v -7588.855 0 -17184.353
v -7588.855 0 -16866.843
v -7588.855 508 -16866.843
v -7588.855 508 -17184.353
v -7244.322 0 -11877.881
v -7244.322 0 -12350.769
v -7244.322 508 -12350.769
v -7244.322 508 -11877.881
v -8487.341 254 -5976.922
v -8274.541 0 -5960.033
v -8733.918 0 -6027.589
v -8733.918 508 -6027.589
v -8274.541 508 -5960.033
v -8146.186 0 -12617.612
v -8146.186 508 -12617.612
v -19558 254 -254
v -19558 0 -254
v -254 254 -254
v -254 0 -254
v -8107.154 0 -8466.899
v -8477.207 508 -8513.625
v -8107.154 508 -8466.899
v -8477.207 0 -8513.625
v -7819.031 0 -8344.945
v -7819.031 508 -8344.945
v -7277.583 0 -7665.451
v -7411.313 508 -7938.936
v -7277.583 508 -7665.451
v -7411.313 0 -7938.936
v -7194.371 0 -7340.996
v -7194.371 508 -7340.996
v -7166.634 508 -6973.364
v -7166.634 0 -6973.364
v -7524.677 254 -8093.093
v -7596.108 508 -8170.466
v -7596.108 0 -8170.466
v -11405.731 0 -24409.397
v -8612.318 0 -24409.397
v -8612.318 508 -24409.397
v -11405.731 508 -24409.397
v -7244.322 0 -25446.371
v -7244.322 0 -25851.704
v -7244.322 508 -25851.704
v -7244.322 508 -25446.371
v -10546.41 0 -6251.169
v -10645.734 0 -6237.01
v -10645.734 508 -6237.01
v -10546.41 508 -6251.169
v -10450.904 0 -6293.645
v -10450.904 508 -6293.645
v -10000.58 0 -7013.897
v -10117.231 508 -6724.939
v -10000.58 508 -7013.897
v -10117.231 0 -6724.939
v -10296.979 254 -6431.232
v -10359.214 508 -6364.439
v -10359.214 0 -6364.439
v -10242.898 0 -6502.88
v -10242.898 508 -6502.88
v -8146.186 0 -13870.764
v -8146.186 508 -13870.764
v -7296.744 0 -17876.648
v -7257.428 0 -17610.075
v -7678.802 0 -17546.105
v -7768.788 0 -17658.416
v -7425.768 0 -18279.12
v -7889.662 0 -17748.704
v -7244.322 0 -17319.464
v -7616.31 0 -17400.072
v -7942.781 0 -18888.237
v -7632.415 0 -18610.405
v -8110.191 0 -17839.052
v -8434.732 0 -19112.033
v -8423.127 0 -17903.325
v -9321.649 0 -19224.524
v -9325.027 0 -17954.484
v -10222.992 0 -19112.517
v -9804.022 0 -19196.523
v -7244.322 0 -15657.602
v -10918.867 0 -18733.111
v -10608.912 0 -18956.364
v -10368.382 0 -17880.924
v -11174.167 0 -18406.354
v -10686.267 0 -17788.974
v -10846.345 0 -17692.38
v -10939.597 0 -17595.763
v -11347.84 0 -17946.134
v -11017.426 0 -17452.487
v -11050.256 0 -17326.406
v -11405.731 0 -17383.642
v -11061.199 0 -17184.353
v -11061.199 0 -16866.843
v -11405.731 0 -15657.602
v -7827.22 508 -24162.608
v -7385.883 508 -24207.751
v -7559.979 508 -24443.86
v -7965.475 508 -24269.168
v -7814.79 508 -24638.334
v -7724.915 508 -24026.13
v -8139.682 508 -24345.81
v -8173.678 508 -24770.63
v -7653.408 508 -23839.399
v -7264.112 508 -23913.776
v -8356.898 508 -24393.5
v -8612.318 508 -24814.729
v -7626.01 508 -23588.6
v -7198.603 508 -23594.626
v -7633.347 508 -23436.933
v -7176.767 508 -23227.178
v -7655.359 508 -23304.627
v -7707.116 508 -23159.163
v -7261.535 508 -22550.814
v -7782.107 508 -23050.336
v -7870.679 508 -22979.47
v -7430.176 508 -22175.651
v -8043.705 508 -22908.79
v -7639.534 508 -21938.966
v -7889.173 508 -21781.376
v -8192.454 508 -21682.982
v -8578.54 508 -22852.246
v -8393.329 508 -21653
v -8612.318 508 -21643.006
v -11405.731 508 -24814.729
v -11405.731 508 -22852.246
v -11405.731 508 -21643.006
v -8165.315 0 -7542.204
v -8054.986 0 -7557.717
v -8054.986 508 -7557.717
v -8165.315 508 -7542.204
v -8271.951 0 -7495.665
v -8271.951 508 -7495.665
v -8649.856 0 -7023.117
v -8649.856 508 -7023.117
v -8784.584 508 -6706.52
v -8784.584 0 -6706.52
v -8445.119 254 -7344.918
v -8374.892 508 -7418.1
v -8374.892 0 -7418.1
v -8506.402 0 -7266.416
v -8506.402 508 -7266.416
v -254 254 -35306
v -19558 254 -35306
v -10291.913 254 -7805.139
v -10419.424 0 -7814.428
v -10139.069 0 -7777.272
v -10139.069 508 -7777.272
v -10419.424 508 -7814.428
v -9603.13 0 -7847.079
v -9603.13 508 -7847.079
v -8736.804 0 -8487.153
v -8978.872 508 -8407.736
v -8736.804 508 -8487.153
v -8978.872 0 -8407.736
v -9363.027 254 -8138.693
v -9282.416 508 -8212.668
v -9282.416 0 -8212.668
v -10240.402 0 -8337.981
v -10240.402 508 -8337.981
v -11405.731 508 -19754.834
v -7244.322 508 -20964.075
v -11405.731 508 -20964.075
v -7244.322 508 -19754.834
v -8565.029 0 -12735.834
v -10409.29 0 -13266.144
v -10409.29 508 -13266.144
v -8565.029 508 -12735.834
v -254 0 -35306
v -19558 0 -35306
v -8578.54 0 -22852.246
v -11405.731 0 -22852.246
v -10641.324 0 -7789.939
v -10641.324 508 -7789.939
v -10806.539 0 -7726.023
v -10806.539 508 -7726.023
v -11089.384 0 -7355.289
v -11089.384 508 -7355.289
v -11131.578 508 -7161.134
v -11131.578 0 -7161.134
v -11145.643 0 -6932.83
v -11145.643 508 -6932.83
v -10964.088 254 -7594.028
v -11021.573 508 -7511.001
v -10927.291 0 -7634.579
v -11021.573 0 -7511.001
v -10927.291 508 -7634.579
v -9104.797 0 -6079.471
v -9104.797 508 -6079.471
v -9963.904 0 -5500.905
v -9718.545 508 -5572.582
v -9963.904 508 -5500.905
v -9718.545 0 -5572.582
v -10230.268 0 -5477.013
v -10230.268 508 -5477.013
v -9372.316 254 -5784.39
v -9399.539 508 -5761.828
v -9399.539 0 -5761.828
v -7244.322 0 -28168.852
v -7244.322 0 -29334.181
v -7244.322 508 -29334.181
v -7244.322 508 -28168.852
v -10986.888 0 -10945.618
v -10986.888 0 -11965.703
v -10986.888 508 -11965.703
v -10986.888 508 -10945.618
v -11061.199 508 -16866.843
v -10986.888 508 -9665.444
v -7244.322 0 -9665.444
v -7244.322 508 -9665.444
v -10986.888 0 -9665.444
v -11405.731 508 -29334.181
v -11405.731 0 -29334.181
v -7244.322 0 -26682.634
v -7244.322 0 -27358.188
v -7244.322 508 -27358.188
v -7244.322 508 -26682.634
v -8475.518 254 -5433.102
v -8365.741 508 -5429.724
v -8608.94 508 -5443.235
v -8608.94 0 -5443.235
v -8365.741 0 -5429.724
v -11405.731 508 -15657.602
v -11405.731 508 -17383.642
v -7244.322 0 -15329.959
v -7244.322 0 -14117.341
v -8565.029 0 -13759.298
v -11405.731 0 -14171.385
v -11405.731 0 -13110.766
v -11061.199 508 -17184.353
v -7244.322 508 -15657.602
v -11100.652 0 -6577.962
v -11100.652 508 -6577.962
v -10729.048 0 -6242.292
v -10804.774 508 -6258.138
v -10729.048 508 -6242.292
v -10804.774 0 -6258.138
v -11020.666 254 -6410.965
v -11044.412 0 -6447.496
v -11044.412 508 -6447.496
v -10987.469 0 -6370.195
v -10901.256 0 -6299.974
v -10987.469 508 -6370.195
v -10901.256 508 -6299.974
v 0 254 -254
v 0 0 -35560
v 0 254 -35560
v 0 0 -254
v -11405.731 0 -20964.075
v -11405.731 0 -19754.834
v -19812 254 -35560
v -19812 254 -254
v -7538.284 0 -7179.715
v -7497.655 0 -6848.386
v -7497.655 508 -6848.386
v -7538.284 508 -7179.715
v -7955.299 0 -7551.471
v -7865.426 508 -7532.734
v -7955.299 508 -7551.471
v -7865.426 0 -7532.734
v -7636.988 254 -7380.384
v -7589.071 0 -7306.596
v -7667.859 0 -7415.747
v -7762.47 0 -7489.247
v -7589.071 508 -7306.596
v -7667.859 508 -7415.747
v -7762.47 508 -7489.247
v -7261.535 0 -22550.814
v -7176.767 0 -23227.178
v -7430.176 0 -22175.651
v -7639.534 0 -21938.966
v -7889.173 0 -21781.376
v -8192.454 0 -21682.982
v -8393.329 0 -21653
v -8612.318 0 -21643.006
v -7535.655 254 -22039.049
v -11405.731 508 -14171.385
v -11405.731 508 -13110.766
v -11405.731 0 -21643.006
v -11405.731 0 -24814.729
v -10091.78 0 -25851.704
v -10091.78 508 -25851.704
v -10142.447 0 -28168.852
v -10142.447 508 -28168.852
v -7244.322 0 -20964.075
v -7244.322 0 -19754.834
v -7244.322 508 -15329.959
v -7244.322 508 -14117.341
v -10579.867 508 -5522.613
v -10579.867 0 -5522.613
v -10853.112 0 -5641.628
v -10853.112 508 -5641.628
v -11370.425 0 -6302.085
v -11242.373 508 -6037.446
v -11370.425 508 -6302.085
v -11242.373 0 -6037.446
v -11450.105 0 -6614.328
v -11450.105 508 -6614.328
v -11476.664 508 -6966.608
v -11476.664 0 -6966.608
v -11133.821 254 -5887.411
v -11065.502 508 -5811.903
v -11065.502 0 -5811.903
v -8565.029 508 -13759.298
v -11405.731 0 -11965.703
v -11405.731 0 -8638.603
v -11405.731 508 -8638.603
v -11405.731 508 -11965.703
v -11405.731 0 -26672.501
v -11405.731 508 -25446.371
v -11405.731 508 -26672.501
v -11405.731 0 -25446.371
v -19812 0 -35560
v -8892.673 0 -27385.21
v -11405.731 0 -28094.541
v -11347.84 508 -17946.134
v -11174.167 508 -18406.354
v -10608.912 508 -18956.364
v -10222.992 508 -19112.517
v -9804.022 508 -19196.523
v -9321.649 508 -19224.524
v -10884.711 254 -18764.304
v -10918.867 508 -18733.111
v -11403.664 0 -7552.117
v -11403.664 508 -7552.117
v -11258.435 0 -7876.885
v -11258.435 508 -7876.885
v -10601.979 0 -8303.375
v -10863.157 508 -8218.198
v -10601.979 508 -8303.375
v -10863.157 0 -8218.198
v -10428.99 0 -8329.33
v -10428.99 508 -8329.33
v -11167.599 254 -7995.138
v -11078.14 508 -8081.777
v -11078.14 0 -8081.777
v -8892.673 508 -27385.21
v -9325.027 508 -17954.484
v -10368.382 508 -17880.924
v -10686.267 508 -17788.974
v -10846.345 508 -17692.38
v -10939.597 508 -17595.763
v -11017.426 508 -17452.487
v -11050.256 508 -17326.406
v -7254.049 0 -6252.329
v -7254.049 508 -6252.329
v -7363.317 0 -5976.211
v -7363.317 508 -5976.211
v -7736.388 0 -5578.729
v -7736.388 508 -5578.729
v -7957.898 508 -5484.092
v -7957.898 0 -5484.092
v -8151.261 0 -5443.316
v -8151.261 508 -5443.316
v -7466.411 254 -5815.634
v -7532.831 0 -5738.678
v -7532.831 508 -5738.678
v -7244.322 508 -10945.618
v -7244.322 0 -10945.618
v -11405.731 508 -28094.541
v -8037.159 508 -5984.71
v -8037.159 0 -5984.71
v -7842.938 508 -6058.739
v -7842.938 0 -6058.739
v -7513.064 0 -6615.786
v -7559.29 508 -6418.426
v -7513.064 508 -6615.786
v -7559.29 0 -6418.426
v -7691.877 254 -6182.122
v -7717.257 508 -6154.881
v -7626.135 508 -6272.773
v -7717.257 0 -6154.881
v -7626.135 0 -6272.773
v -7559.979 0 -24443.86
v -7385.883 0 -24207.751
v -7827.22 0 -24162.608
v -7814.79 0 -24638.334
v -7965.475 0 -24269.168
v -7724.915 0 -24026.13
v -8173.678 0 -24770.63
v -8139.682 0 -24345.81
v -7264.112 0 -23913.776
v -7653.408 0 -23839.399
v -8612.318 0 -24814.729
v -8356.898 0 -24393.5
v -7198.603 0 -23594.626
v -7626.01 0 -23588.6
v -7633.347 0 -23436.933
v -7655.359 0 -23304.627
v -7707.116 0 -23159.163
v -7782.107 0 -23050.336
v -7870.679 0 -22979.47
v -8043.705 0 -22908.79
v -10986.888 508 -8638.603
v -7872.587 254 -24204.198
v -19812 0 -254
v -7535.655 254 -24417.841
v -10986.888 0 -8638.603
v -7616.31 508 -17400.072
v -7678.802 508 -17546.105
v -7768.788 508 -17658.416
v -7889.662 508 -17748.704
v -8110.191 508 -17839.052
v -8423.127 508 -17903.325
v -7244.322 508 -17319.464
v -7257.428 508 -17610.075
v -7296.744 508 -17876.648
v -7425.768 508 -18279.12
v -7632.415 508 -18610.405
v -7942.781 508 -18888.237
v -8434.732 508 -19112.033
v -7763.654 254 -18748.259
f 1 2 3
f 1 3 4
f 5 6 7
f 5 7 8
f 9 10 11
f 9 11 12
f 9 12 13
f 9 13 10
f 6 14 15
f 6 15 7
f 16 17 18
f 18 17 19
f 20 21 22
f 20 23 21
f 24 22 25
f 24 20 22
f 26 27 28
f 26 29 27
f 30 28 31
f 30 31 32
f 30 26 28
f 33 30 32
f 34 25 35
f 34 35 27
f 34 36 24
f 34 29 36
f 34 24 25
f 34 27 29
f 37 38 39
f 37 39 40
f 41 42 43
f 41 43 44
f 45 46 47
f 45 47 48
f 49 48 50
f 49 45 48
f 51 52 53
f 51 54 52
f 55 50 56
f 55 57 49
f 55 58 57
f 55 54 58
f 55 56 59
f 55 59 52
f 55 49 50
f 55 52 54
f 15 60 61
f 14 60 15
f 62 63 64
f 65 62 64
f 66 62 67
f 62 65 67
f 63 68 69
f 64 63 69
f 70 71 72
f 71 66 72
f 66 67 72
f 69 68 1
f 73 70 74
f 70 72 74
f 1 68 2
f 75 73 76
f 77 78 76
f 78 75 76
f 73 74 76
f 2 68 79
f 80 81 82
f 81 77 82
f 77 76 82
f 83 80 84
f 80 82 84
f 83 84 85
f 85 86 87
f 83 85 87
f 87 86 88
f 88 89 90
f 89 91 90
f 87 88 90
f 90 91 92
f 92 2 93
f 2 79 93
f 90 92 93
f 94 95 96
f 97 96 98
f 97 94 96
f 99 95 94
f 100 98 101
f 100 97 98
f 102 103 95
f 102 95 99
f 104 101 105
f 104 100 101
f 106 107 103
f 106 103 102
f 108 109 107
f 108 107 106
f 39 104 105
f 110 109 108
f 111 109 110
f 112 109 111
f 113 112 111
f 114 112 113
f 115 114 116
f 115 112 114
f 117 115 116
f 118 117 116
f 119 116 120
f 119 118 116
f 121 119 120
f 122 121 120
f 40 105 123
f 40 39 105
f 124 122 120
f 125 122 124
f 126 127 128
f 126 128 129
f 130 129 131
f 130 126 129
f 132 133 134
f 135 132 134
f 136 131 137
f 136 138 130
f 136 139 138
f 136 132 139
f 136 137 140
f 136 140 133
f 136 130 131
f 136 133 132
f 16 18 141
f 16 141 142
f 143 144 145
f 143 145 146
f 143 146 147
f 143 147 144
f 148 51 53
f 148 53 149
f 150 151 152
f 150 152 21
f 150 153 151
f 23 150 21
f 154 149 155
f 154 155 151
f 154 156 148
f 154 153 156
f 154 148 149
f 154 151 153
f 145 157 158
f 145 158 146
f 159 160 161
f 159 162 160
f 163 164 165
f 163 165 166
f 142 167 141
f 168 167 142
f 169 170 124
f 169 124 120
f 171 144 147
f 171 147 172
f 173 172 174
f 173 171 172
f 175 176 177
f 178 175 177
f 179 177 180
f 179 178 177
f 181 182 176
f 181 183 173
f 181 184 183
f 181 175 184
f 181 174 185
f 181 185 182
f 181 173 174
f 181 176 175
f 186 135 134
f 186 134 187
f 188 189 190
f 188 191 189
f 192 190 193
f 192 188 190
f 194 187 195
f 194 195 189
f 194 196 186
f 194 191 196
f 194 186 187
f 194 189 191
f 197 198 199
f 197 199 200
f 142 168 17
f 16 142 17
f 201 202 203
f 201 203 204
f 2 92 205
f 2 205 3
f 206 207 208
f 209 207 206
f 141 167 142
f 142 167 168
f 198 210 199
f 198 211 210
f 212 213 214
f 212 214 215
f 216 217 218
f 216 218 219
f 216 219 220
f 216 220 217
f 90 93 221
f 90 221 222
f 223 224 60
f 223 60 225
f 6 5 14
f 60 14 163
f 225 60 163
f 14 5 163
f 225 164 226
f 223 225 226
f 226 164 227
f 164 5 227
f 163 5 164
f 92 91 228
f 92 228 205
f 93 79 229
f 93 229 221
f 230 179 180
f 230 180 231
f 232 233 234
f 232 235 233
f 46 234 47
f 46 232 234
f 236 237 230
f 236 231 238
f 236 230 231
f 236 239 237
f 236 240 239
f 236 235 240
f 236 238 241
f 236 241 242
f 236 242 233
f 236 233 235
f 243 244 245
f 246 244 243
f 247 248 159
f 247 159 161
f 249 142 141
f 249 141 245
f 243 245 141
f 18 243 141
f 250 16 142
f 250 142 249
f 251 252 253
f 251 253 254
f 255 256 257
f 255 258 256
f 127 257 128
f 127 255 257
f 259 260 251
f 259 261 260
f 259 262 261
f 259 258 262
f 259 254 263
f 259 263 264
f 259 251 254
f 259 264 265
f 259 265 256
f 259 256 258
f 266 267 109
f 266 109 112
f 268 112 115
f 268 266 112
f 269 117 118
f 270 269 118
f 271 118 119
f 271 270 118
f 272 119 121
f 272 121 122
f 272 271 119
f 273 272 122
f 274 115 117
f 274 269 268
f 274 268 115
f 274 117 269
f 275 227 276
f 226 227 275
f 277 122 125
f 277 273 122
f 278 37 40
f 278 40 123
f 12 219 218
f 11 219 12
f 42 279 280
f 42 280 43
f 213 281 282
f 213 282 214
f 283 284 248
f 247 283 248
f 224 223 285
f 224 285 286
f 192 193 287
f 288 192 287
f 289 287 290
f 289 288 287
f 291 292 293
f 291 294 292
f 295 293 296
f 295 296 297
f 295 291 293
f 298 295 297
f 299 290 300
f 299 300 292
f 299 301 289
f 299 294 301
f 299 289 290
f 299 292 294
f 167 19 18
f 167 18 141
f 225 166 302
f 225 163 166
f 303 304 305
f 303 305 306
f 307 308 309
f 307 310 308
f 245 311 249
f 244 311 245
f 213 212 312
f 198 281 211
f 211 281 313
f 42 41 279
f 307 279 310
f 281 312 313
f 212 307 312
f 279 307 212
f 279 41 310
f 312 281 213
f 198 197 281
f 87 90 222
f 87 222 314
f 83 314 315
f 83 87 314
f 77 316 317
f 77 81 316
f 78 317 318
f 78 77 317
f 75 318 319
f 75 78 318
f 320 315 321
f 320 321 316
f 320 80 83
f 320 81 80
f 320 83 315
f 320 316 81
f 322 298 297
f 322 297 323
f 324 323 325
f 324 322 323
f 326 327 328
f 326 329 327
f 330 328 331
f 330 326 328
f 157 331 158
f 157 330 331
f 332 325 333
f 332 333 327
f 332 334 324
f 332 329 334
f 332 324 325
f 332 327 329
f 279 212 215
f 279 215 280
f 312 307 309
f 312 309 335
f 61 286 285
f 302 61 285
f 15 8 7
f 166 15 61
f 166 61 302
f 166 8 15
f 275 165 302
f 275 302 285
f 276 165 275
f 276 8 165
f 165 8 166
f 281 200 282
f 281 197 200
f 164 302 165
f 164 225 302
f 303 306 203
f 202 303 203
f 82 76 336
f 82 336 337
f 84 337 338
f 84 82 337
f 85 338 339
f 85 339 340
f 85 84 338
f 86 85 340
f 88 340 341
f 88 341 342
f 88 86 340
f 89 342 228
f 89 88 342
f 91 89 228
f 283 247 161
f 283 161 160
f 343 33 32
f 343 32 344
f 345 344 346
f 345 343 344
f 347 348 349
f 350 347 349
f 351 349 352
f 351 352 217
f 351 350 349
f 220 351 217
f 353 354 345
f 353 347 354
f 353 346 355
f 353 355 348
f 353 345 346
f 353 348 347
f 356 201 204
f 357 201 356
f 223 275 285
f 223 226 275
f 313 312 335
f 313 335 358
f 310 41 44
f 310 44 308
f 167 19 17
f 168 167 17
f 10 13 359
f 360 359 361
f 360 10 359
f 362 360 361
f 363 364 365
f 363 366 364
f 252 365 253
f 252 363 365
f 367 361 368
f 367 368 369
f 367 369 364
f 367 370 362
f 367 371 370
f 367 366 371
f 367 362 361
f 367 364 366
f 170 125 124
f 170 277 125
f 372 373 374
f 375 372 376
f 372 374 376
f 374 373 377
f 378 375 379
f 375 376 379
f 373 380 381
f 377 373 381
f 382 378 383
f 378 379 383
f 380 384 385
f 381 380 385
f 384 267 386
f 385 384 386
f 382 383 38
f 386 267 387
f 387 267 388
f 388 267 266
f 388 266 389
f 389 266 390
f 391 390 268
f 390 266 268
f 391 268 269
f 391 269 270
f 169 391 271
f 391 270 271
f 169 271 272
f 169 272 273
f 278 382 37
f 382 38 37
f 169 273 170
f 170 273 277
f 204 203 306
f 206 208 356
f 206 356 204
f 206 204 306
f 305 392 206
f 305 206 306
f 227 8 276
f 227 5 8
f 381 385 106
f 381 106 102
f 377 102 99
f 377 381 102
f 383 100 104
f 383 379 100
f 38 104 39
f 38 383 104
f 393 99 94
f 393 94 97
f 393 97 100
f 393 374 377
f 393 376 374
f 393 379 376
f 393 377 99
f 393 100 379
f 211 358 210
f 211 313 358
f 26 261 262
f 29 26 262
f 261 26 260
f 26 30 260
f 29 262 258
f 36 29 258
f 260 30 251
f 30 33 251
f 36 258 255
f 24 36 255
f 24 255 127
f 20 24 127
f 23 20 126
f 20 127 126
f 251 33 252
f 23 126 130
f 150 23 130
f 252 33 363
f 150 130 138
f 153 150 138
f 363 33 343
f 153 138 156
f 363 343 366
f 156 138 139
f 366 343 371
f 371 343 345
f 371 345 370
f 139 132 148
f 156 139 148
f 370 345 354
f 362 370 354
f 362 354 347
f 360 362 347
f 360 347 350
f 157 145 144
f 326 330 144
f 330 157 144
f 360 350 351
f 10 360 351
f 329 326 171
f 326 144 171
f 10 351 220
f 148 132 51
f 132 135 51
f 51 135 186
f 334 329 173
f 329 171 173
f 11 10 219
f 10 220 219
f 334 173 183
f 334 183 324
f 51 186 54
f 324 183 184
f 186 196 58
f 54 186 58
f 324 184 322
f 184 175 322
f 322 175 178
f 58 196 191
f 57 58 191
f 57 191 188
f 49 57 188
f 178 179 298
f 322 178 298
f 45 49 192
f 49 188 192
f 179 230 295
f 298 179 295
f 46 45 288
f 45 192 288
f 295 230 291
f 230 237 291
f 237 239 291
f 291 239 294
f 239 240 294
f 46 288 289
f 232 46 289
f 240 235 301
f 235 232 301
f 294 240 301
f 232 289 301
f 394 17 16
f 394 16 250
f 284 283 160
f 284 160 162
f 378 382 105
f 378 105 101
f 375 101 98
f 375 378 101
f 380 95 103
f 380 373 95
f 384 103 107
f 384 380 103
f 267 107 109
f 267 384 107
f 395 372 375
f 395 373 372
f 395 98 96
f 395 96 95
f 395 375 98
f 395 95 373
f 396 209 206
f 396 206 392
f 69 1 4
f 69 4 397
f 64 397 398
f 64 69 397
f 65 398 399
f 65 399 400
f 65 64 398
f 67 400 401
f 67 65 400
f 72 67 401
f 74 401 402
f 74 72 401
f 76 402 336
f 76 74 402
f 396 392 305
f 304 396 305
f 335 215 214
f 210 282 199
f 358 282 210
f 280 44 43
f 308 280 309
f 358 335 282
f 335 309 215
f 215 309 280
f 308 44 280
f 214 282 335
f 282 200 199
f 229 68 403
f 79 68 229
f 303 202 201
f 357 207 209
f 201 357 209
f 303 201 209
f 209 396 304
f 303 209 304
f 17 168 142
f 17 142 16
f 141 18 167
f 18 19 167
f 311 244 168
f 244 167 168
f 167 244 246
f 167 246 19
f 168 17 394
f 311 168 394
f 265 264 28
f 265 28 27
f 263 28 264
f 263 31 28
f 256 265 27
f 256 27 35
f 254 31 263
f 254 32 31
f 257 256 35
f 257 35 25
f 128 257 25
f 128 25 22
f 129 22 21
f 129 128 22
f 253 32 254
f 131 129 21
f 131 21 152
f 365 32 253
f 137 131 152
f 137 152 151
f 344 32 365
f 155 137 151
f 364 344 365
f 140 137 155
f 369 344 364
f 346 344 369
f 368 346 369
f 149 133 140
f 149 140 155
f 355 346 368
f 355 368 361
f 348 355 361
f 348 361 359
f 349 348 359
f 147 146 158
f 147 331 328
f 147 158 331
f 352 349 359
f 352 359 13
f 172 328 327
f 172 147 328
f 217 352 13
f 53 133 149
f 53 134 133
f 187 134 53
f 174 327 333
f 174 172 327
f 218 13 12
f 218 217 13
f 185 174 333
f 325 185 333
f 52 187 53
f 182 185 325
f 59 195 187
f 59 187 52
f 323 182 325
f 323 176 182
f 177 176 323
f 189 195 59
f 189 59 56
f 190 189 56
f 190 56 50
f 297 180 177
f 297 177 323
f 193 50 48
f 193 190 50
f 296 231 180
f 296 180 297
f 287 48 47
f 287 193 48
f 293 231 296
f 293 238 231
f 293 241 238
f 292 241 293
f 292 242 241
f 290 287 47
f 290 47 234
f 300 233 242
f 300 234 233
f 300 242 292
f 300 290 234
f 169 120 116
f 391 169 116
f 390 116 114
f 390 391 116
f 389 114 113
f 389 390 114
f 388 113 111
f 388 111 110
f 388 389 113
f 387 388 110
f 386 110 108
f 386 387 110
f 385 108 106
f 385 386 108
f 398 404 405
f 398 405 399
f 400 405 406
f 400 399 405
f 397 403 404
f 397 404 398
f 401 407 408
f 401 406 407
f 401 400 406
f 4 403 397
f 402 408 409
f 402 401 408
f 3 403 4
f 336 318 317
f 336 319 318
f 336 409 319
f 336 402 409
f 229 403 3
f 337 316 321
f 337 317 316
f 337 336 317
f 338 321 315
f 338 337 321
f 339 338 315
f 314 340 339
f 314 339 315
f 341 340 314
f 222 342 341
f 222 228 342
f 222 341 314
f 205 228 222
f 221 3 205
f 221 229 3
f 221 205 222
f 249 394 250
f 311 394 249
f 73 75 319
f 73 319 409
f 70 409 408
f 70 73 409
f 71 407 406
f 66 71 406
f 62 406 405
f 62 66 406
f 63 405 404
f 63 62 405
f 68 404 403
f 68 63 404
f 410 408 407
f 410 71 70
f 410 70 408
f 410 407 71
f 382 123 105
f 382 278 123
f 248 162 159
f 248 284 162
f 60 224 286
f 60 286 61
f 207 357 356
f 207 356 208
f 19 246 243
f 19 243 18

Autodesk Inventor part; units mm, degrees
ref_plane "YZ Plane" through (0, 0, 0) normal (1, 0, 0) x (0, 1, 0)
ref_plane "XZ Plane" through (0, 0, 0) normal (0, 1, 0) x (-1, 0, 0)
ref_plane "XY Plane" through (0, 0, 0) normal (0, 0, 1) x (1, 0, 0)
sketch "Sketch1" plane through (0, 0, 0) normal (0, 1, 0) x (-1, 0, 0)
  line L0 (0, 0) -> (19812, 0)
  line L1 (19812, 0) -> (19812, -35560)
  line L2 (19812, -35560) -> (0, -35560)
  line L3 (0, -35560) -> (0, 0)
  line L4 (19558, -35306) -> (19558, -254)
  line L5 (19558, -254) -> (254, -254)
  line L6 (254, -254) -> (254, -35306)
  line L7 (254, -35306) -> (19558, -35306)
  line L8 (11476.6644, -5257.4578) -> (11476.6644, -18725.3039) construction
  line L9 (11476.6644, -18725.3039) -> (-12932.071, -18725.3039) construction
  line L10 (-12932.071, -18725.3039) -> (-12932.071, -5257.4578) construction
  line L11 (-12932.071, -5257.4578) -> (11476.6644, -5257.4578) construction
  line L12 (10240.4018, -8337.9814) -> (10139.0688, -7777.272)
  spline S0 degree 2 poles (10139.0688, -7777.272) (10304.5794, -7814.4275) (10419.4235, -7814.4275) knots 0 0 0 1 1 1
  spline S1 degree 2 poles (10419.4235, -7814.4275) (11145.6434, -7814.4275) (11145.6434, -6932.8303) knots 0 0 0 1 1 1
  spline S2 degree 2 poles (11145.6434, -6932.8303) (11145.6434, -6237.0103) (10645.7338, -6237.0103) knots 0 0 0 1 1 1
  spline S3 degree 2 poles (10645.7338, -6237.0103) (10270.8017, -6237.0103) (10000.5803, -7013.8967) knots 0 0 0 1 1 1
  spline S4 degree 2 poles (10000.5803, -7013.8967) (9487.1597, -8513.6252) (8477.2074, -8513.6252) knots 0 0 0 1 1 1
  spline S5 degree 2 poles (8477.2074, -8513.6252) (7882.7204, -8513.6252) (7166.6338, -7672.5613) (7166.6338, -6973.3635) knots 0 0 0 1 2 2 2
  spline S6 degree 2 poles (7166.6338, -6973.3635) (7166.6338, -5429.7239) (8365.7411, -5429.7239) knots 0 0 0 1 1 1
  spline S7 degree 2 poles (8365.7411, -5429.7239) (8463.6963, -5429.7239) (8608.9403, -5443.235) knots 0 0 0 1 1 1
  line L13 (8608.9403, -5443.235) -> (8733.9177, -6027.5887)
  spline S8 degree 2 poles (8733.9177, -6027.5887) (8470.4519, -5960.0334) (8274.5414, -5960.0334) knots 0 0 0 1 1 1
  spline S9 degree 2 poles (8274.5414, -5960.0334) (7497.655, -5960.0334) (7497.655, -6848.3861) knots 0 0 0 1 1 1
  spline S10 degree 2 poles (7497.655, -6848.3861) (7497.655, -7557.7172) (8054.9865, -7557.7172) knots 0 0 0 1 1 1
  spline S11 degree 2 poles (8054.9865, -7557.7172) (8470.4519, -7557.7172) (8784.5842, -6706.5199) knots 0 0 0 1 1 1
  spline S12 degree 2 poles (8784.5842, -6706.5199) (9237.205, -5477.0127) (10230.2685, -5477.0127) knots 0 0 0 1 1 1
  spline S13 degree 2 poles (10230.2685, -5477.0127) (10790.9778, -5477.0127) (11476.6645, -6297.8101) (11476.6645, -6966.6079) knots 0 0 0 1 2 2 2
  spline S14 degree 2 poles (11476.6645, -6966.6079) (11476.6645, -8337.9814) (10240.4018, -8337.9814) knots 0 0 0 1 1 1
  line L14 (11405.7314, -11965.7032) -> (10986.8883, -11965.7032)
  line L15 (10986.8883, -11965.7032) -> (10986.8883, -10945.6175)
  line L16 (10986.8883, -10945.6175) -> (7244.3224, -10945.6175)
  line L17 (7244.3224, -10945.6175) -> (7244.3224, -9665.4438)
  line L18 (7244.3224, -9665.4438) -> (10986.8883, -9665.4438)
  line L19 (10986.8883, -9665.4438) -> (10986.8883, -8638.6026)
  line L20 (10986.8883, -8638.6026) -> (11405.7314, -8638.6026)
  line L21 (11405.7314, -8638.6026) -> (11405.7314, -11965.7032)
  line L22 (11405.7314, -14171.385) -> (7244.3224, -15329.9591)
  line L23 (7244.3224, -15329.9591) -> (7244.3224, -14117.3408)
  line L24 (7244.3224, -14117.3408) -> (8146.1862, -13870.7638)
  line L25 (8146.1862, -13870.7638) -> (8146.1862, -12617.6122)
  line L26 (8146.1862, -12617.6122) -> (7244.3224, -12350.7686)
  line L27 (7244.3224, -12350.7686) -> (7244.3224, -11877.8812)
  line L28 (7244.3224, -11877.8812) -> (11405.7314, -13110.7662)
  line L29 (11405.7314, -13110.7662) -> (11405.7314, -14171.385)
  line L30 (8565.0293, -12735.8341) -> (8565.0293, -13759.2975)
  line L31 (8565.0293, -13759.2975) -> (10409.2902, -13266.1435)
  line L32 (10409.2902, -13266.1435) -> (8565.0293, -12735.8341)
  line L33 (7244.3224, -15657.6025) -> (11405.7314, -15657.6025)
  line L34 (11405.7314, -15657.6025) -> (11405.7314, -17383.6415)
  spline S15 degree 2 poles (11405.7314, -17383.6415) (11405.7314, -19224.5245) (9321.6492, -19224.5245) knots 0 0 0 1 1 1
  spline S16 degree 2 poles (9321.6492, -19224.5245) (7244.3224, -19224.5245) (7244.3224, -17319.4639) knots 0 0 0 1 1 1
  line L35 (7244.3224, -17319.4639) -> (7244.3224, -15657.6025)
  line L36 (7588.8547, -16866.8431) -> (7588.8547, -17184.3532)
  spline S17 degree 2 poles (7588.8547, -17184.3532) (7588.8547, -17620.0852) (8342.0967, -17954.4841) (9325.0269, -17954.4841) knots 0 0 0 1 2 2 2
  spline S18 degree 2 poles (9325.0269, -17954.4841) (10311.3349, -17954.4841) (11061.1992, -17623.463) (11061.1992, -17184.3532) knots 0 0 0 1 2 2 2
  line L37 (11061.1992, -17184.3532) -> (11061.1992, -16866.8431)
  line L38 (11061.1992, -16866.8431) -> (7588.8547, -16866.8431)
  line L39 (11405.7314, -20964.0746) -> (7244.3224, -20964.0746)
  line L40 (7244.3224, -20964.0746) -> (7244.3224, -19754.834)
  line L41 (7244.3224, -19754.834) -> (11405.7314, -19754.834)
  line L42 (11405.7314, -19754.834) -> (11405.7314, -20964.0746)
  line L43 (11405.7314, -24814.729) -> (8612.3181, -24814.729)
  spline S19 degree 2 poles (8612.3181, -24814.729) (7176.7671, -24814.729) (7176.7671, -23227.1785) knots 0 0 0 1 1 1
  spline S20 degree 2 poles (7176.7671, -23227.1785) (7176.7671, -21643.0057) (8612.3181, -21643.0057) knots 0 0 0 1 1 1
  line L44 (8612.3181, -21643.0057) -> (11405.7314, -21643.0057)
  line L45 (11405.7314, -21643.0057) -> (11405.7314, -22852.2463)
  line L46 (11405.7314, -22852.2463) -> (8578.5404, -22852.2463)
  spline S21 degree 2 poles (8578.5404, -22852.2463) (8027.9644, -22852.2463) (7626.0101, -23166.3787) (7626.0101, -23588.5996) knots 0 0 0 1 2 2 2
  spline S22 degree 2 poles (7626.0101, -23588.5996) (7626.0101, -24409.397) (8612.3181, -24409.397) knots 0 0 0 1 1 1
  line L47 (8612.3181, -24409.397) -> (11405.7314, -24409.397)
  line L48 (11405.7314, -24409.397) -> (11405.7314, -24814.729)
  line L49 (11405.7314, -29334.1813) -> (7244.3224, -29334.1813)
  line L50 (7244.3224, -29334.1813) -> (7244.3224, -28168.8517)
  line L51 (7244.3224, -28168.8517) -> (10142.4466, -28168.8517)
  line L52 (10142.4466, -28168.8517) -> (7244.3224, -27358.1876)
  line L53 (7244.3224, -27358.1876) -> (7244.3224, -26682.6342)
  line L54 (7244.3224, -26682.6342) -> (10091.78, -25851.7035)
  line L55 (10091.78, -25851.7035) -> (7244.3224, -25851.7035)
  line L56 (7244.3224, -25851.7035) -> (7244.3224, -25446.3714)
  line L57 (7244.3224, -25446.3714) -> (11405.7314, -25446.3714)
  line L58 (11405.7314, -25446.3714) -> (11405.7314, -26672.5009)
  line L59 (11405.7314, -26672.5009) -> (8892.6727, -27385.2097)
  line L60 (8892.6727, -27385.2097) -> (11405.7314, -28094.5408)
  line L61 (11405.7314, -28094.5408) -> (11405.7314, -29334.1813)
extrude "Extrusion1" add sketch "Sketch1" along normal blind 508 contours L12 S0 S1 S2 S3 S4 S5 S6 S7 L13 S8 S9 S10 S11 S12 S13 S14 | L14 L15 L16 L17 L18 L19 L20 L21 | L22 L23 L24 L25 L26 L27 L28 L29 | L33 L34 S15 S16 L35 | L39 L40 L41 L42 | L43 S19 S20 L44 L45 L46 S21 S22 L47 L48 | L49 L50 L51 L52 L53 L54 L55 L56 L57 L58 L59 L60 L61
extrude "Extrusion2" add sketch "Sketch1" along normal blind 254 separate body contours L7 L6 L5 L4 | L12 S0 S1 S2 S3 S4 S5 S6 S7 L13 S8 S9 S10 S11 S12 S13 S14 | L14 L15 L16 L17 L18 L19 L20 L21 | L22 L23 L24 L25 L26 L27 L28 L29 | L32 L31 L30 | L33 L34 S15 S16 L35 | L38 L37 S18 S17 L36 | L39 L40 L41 L42 | L43 S19 S20 L44 L45 L46 S21 S22 L47 L48 | L49 L50 L51 L52 L53 L54 L55 L56 L57 L58 L59 L60 L61
extrude "Extrusion3" add sketch "Sketch1" along normal blind 254 separate body contours L0 L1 L2 L3
sketch "Sketch2" plane through (0, 254, 0) normal (0, 1, 0) x (1, 0, 0)
  line L0 (0, 254) -> (-34633.9567, 254)
  line L1 (-34633.9567, 254) -> (-34633.9567, -21754.7824)
  line L2 (-34633.9567, -21754.7824) -> (0, -21754.7824)
  line L3 (0, -21754.7824) -> (0, 254)
  point P0 (0, 0)
extrude "Extrusion4" cut sketch "Sketch2" along normal mid plane 762 bodies 3
properties part number "banner2"
